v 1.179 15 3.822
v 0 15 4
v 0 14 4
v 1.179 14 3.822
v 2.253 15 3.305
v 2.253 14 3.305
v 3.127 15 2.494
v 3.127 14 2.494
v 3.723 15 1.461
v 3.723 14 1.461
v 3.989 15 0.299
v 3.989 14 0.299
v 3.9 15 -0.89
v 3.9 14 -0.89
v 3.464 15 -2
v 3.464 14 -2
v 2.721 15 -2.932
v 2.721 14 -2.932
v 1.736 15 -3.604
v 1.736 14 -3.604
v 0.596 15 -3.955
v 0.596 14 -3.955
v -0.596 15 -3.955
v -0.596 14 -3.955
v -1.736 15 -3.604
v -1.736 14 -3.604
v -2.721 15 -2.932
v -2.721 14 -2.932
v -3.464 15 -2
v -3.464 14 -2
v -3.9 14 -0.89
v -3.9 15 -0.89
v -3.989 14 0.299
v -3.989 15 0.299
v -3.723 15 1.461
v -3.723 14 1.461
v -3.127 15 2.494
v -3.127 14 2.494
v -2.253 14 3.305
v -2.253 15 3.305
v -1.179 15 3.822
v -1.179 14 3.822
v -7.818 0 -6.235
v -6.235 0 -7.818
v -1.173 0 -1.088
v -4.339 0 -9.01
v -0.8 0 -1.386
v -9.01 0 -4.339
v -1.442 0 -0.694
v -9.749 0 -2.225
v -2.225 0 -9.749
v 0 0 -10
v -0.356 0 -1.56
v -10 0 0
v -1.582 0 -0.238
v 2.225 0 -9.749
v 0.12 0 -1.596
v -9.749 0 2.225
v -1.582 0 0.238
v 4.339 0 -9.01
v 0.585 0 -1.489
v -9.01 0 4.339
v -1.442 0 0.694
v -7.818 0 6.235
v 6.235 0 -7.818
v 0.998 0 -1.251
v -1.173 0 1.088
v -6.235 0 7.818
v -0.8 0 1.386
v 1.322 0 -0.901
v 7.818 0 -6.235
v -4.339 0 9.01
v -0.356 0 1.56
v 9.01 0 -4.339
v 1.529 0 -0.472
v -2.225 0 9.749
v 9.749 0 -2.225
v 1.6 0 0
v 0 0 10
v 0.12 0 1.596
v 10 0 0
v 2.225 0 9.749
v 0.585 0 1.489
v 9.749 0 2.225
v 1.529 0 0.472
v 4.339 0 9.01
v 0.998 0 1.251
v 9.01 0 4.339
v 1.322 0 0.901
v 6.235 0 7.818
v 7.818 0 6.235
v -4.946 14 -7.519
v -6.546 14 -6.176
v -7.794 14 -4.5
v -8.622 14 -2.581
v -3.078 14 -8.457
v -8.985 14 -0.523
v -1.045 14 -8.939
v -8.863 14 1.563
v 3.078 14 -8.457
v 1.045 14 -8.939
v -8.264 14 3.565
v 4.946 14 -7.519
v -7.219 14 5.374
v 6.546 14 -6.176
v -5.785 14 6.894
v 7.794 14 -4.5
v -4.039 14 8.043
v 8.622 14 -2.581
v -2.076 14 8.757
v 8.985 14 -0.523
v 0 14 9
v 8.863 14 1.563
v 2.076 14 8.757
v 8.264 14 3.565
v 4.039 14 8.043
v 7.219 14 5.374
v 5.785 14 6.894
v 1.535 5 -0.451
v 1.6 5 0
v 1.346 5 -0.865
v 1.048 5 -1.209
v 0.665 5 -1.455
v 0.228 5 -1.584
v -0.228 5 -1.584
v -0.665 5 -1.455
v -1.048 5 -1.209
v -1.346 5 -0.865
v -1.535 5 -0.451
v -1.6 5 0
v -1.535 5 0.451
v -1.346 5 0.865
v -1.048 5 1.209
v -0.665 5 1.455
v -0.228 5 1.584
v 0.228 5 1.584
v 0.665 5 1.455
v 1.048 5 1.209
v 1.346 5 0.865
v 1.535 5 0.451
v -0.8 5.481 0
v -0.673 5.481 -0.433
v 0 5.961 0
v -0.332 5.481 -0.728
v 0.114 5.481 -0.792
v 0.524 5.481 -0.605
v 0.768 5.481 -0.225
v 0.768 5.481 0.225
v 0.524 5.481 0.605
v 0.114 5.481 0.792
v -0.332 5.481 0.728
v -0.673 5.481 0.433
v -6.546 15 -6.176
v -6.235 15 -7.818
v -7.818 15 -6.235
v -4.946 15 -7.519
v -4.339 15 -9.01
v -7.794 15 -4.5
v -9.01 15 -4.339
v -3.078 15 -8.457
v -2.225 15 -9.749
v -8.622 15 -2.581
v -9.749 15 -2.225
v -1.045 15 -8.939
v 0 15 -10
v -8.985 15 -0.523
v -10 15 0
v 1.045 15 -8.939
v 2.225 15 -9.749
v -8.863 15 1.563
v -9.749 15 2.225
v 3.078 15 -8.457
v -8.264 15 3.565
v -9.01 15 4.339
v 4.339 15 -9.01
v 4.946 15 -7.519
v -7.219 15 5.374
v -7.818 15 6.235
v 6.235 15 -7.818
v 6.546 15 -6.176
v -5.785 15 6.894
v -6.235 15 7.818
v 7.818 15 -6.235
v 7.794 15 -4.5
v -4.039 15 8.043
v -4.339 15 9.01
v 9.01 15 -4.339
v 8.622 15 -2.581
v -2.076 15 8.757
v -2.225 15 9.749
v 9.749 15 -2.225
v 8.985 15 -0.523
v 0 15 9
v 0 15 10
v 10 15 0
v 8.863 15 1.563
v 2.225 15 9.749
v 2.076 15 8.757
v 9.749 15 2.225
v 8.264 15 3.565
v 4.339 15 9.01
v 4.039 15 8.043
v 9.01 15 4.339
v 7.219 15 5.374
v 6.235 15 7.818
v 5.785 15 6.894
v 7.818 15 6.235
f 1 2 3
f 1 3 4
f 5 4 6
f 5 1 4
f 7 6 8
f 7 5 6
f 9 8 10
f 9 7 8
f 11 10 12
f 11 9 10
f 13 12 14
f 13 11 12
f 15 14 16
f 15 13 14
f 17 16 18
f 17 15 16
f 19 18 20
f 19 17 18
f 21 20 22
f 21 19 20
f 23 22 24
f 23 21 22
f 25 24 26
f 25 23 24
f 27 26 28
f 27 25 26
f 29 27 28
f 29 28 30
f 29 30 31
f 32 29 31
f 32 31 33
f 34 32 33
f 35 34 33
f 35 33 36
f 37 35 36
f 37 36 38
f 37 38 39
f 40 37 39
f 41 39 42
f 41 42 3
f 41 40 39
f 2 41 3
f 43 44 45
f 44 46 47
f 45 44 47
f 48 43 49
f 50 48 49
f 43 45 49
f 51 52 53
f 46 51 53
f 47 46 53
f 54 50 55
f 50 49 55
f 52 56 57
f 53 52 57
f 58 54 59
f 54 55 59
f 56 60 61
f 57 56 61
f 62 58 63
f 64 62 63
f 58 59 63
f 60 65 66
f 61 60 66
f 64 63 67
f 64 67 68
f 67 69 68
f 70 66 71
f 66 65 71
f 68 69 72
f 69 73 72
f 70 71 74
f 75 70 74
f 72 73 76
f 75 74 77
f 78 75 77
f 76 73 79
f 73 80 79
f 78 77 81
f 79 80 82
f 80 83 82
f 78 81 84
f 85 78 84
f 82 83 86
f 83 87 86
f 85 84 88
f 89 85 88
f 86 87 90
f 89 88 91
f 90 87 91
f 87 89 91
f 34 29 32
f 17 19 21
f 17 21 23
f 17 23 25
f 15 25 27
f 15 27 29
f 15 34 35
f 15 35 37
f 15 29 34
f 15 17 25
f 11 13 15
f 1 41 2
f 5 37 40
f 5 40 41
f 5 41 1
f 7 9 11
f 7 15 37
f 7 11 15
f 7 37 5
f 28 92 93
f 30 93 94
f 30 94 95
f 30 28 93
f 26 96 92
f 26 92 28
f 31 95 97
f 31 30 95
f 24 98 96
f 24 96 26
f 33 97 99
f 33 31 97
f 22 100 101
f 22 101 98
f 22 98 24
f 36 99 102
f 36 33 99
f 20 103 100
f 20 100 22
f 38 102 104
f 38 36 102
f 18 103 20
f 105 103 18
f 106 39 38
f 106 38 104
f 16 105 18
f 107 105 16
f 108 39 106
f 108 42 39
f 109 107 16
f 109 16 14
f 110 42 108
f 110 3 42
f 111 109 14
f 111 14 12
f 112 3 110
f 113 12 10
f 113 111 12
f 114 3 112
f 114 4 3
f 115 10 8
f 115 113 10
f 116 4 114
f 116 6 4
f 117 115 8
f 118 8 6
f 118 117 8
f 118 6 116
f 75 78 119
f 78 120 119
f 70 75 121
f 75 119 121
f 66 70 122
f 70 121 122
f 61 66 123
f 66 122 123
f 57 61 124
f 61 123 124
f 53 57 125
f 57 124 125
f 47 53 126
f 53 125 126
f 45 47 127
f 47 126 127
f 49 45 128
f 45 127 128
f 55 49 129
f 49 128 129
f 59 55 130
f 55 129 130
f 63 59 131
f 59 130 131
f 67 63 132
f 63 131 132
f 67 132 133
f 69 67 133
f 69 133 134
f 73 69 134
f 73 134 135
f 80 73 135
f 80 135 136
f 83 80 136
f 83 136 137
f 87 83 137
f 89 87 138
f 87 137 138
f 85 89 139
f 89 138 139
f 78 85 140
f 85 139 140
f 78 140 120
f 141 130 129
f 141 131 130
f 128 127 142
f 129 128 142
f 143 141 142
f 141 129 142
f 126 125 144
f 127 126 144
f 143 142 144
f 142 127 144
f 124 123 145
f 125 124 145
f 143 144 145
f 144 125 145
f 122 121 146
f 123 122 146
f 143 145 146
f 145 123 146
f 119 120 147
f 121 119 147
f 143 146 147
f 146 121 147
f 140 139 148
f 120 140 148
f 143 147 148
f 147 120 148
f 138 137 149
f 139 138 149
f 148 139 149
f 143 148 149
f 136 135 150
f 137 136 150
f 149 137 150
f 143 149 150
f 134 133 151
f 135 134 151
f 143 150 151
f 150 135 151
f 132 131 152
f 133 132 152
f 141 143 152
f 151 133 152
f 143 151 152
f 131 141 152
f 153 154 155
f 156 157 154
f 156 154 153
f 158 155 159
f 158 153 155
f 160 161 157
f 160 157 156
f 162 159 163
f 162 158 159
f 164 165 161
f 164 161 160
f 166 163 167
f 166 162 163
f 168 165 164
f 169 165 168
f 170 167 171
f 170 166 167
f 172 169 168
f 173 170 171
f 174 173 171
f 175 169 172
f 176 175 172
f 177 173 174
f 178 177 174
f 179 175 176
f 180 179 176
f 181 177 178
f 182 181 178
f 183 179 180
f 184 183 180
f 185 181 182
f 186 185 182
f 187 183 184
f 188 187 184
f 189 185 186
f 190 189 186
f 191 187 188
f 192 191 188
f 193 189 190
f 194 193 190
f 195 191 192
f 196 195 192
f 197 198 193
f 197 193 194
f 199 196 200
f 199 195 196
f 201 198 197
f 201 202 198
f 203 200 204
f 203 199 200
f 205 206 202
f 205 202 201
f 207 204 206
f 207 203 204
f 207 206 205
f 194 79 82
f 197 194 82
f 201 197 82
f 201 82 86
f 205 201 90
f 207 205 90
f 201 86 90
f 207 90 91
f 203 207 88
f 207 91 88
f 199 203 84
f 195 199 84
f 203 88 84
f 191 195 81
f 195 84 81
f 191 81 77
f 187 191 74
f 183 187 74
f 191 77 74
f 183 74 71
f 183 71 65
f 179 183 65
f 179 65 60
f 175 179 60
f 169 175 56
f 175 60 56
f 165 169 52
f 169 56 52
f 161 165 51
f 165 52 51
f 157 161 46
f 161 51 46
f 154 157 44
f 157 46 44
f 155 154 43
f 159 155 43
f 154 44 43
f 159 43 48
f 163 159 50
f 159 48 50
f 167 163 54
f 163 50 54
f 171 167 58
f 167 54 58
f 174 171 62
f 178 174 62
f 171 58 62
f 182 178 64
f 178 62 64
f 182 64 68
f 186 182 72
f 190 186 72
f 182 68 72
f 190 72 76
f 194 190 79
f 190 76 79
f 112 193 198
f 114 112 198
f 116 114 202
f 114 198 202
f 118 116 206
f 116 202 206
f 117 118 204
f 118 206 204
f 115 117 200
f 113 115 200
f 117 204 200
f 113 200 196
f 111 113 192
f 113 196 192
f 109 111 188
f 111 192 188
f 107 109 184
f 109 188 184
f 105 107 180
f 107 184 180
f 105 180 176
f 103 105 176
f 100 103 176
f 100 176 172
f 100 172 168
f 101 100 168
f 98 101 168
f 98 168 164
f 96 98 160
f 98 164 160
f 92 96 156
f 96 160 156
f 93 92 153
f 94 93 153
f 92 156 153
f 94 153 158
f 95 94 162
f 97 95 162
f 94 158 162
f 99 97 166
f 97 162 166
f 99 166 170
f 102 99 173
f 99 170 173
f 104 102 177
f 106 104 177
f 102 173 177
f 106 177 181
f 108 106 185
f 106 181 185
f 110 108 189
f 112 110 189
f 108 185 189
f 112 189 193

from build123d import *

# Parameters (mm, degrees)
SKETCH1_R                = 10
BOSS_EXTRUDE1_DEPTH      = 15
SKETCH2_R                = 9
SKETCH2_R_2              = 4
CUT_EXTRUDE1_DEPTH       = 1
M3_CLEARANCE_HOLE1_D     = 3.2
M3_CLEARANCE_HOLE1_DEPTH = 5
M3_CLEARANCE_HOLE1_TIP   = 0.96137699


with BuildPart() as part:
    # Sketch1 → Boss-Extrude1 (new body)
    with BuildSketch(Plane(origin=(0, 0, 0), x_dir=(1, 0, 0), z_dir=(0, 1, 0))):
        with Locations(Location((0, 0, 0), (0, 0, 270))):
            Circle(SKETCH1_R)
    extrude(amount=BOSS_EXTRUDE1_DEPTH)

    # Sketch2 → Cut-Extrude1 (cut)
    with BuildSketch(Plane(origin=(0, 15, 0), x_dir=(1, 0, 0), z_dir=(0, 1, 0))):
        with Locations(Location((0, 0, 0), (0, 0, 270))):
            Circle(SKETCH2_R)
        with Locations(Location((0, 0, 0), (0, 0, 270))):
            Circle(SKETCH2_R_2, mode=Mode.SUBTRACT)
    extrude(amount=-CUT_EXTRUDE1_DEPTH, mode=Mode.SUBTRACT)

    # M3 Clearance Hole1
    with Locations(Plane(origin=(0, 0, 0), x_dir=(-1, 0, 0), z_dir=(0, -1, 0))):
        with Locations((0, 0)):
            Hole(M3_CLEARANCE_HOLE1_D / 2, depth=M3_CLEARANCE_HOLE1_DEPTH)
            with Locations((0, 0, -(M3_CLEARANCE_HOLE1_DEPTH + M3_CLEARANCE_HOLE1_TIP / 2))):  # 118° drill point
                Cone(0, M3_CLEARANCE_HOLE1_D / 2, M3_CLEARANCE_HOLE1_TIP, mode=Mode.SUBTRACT)


solid = part.part
